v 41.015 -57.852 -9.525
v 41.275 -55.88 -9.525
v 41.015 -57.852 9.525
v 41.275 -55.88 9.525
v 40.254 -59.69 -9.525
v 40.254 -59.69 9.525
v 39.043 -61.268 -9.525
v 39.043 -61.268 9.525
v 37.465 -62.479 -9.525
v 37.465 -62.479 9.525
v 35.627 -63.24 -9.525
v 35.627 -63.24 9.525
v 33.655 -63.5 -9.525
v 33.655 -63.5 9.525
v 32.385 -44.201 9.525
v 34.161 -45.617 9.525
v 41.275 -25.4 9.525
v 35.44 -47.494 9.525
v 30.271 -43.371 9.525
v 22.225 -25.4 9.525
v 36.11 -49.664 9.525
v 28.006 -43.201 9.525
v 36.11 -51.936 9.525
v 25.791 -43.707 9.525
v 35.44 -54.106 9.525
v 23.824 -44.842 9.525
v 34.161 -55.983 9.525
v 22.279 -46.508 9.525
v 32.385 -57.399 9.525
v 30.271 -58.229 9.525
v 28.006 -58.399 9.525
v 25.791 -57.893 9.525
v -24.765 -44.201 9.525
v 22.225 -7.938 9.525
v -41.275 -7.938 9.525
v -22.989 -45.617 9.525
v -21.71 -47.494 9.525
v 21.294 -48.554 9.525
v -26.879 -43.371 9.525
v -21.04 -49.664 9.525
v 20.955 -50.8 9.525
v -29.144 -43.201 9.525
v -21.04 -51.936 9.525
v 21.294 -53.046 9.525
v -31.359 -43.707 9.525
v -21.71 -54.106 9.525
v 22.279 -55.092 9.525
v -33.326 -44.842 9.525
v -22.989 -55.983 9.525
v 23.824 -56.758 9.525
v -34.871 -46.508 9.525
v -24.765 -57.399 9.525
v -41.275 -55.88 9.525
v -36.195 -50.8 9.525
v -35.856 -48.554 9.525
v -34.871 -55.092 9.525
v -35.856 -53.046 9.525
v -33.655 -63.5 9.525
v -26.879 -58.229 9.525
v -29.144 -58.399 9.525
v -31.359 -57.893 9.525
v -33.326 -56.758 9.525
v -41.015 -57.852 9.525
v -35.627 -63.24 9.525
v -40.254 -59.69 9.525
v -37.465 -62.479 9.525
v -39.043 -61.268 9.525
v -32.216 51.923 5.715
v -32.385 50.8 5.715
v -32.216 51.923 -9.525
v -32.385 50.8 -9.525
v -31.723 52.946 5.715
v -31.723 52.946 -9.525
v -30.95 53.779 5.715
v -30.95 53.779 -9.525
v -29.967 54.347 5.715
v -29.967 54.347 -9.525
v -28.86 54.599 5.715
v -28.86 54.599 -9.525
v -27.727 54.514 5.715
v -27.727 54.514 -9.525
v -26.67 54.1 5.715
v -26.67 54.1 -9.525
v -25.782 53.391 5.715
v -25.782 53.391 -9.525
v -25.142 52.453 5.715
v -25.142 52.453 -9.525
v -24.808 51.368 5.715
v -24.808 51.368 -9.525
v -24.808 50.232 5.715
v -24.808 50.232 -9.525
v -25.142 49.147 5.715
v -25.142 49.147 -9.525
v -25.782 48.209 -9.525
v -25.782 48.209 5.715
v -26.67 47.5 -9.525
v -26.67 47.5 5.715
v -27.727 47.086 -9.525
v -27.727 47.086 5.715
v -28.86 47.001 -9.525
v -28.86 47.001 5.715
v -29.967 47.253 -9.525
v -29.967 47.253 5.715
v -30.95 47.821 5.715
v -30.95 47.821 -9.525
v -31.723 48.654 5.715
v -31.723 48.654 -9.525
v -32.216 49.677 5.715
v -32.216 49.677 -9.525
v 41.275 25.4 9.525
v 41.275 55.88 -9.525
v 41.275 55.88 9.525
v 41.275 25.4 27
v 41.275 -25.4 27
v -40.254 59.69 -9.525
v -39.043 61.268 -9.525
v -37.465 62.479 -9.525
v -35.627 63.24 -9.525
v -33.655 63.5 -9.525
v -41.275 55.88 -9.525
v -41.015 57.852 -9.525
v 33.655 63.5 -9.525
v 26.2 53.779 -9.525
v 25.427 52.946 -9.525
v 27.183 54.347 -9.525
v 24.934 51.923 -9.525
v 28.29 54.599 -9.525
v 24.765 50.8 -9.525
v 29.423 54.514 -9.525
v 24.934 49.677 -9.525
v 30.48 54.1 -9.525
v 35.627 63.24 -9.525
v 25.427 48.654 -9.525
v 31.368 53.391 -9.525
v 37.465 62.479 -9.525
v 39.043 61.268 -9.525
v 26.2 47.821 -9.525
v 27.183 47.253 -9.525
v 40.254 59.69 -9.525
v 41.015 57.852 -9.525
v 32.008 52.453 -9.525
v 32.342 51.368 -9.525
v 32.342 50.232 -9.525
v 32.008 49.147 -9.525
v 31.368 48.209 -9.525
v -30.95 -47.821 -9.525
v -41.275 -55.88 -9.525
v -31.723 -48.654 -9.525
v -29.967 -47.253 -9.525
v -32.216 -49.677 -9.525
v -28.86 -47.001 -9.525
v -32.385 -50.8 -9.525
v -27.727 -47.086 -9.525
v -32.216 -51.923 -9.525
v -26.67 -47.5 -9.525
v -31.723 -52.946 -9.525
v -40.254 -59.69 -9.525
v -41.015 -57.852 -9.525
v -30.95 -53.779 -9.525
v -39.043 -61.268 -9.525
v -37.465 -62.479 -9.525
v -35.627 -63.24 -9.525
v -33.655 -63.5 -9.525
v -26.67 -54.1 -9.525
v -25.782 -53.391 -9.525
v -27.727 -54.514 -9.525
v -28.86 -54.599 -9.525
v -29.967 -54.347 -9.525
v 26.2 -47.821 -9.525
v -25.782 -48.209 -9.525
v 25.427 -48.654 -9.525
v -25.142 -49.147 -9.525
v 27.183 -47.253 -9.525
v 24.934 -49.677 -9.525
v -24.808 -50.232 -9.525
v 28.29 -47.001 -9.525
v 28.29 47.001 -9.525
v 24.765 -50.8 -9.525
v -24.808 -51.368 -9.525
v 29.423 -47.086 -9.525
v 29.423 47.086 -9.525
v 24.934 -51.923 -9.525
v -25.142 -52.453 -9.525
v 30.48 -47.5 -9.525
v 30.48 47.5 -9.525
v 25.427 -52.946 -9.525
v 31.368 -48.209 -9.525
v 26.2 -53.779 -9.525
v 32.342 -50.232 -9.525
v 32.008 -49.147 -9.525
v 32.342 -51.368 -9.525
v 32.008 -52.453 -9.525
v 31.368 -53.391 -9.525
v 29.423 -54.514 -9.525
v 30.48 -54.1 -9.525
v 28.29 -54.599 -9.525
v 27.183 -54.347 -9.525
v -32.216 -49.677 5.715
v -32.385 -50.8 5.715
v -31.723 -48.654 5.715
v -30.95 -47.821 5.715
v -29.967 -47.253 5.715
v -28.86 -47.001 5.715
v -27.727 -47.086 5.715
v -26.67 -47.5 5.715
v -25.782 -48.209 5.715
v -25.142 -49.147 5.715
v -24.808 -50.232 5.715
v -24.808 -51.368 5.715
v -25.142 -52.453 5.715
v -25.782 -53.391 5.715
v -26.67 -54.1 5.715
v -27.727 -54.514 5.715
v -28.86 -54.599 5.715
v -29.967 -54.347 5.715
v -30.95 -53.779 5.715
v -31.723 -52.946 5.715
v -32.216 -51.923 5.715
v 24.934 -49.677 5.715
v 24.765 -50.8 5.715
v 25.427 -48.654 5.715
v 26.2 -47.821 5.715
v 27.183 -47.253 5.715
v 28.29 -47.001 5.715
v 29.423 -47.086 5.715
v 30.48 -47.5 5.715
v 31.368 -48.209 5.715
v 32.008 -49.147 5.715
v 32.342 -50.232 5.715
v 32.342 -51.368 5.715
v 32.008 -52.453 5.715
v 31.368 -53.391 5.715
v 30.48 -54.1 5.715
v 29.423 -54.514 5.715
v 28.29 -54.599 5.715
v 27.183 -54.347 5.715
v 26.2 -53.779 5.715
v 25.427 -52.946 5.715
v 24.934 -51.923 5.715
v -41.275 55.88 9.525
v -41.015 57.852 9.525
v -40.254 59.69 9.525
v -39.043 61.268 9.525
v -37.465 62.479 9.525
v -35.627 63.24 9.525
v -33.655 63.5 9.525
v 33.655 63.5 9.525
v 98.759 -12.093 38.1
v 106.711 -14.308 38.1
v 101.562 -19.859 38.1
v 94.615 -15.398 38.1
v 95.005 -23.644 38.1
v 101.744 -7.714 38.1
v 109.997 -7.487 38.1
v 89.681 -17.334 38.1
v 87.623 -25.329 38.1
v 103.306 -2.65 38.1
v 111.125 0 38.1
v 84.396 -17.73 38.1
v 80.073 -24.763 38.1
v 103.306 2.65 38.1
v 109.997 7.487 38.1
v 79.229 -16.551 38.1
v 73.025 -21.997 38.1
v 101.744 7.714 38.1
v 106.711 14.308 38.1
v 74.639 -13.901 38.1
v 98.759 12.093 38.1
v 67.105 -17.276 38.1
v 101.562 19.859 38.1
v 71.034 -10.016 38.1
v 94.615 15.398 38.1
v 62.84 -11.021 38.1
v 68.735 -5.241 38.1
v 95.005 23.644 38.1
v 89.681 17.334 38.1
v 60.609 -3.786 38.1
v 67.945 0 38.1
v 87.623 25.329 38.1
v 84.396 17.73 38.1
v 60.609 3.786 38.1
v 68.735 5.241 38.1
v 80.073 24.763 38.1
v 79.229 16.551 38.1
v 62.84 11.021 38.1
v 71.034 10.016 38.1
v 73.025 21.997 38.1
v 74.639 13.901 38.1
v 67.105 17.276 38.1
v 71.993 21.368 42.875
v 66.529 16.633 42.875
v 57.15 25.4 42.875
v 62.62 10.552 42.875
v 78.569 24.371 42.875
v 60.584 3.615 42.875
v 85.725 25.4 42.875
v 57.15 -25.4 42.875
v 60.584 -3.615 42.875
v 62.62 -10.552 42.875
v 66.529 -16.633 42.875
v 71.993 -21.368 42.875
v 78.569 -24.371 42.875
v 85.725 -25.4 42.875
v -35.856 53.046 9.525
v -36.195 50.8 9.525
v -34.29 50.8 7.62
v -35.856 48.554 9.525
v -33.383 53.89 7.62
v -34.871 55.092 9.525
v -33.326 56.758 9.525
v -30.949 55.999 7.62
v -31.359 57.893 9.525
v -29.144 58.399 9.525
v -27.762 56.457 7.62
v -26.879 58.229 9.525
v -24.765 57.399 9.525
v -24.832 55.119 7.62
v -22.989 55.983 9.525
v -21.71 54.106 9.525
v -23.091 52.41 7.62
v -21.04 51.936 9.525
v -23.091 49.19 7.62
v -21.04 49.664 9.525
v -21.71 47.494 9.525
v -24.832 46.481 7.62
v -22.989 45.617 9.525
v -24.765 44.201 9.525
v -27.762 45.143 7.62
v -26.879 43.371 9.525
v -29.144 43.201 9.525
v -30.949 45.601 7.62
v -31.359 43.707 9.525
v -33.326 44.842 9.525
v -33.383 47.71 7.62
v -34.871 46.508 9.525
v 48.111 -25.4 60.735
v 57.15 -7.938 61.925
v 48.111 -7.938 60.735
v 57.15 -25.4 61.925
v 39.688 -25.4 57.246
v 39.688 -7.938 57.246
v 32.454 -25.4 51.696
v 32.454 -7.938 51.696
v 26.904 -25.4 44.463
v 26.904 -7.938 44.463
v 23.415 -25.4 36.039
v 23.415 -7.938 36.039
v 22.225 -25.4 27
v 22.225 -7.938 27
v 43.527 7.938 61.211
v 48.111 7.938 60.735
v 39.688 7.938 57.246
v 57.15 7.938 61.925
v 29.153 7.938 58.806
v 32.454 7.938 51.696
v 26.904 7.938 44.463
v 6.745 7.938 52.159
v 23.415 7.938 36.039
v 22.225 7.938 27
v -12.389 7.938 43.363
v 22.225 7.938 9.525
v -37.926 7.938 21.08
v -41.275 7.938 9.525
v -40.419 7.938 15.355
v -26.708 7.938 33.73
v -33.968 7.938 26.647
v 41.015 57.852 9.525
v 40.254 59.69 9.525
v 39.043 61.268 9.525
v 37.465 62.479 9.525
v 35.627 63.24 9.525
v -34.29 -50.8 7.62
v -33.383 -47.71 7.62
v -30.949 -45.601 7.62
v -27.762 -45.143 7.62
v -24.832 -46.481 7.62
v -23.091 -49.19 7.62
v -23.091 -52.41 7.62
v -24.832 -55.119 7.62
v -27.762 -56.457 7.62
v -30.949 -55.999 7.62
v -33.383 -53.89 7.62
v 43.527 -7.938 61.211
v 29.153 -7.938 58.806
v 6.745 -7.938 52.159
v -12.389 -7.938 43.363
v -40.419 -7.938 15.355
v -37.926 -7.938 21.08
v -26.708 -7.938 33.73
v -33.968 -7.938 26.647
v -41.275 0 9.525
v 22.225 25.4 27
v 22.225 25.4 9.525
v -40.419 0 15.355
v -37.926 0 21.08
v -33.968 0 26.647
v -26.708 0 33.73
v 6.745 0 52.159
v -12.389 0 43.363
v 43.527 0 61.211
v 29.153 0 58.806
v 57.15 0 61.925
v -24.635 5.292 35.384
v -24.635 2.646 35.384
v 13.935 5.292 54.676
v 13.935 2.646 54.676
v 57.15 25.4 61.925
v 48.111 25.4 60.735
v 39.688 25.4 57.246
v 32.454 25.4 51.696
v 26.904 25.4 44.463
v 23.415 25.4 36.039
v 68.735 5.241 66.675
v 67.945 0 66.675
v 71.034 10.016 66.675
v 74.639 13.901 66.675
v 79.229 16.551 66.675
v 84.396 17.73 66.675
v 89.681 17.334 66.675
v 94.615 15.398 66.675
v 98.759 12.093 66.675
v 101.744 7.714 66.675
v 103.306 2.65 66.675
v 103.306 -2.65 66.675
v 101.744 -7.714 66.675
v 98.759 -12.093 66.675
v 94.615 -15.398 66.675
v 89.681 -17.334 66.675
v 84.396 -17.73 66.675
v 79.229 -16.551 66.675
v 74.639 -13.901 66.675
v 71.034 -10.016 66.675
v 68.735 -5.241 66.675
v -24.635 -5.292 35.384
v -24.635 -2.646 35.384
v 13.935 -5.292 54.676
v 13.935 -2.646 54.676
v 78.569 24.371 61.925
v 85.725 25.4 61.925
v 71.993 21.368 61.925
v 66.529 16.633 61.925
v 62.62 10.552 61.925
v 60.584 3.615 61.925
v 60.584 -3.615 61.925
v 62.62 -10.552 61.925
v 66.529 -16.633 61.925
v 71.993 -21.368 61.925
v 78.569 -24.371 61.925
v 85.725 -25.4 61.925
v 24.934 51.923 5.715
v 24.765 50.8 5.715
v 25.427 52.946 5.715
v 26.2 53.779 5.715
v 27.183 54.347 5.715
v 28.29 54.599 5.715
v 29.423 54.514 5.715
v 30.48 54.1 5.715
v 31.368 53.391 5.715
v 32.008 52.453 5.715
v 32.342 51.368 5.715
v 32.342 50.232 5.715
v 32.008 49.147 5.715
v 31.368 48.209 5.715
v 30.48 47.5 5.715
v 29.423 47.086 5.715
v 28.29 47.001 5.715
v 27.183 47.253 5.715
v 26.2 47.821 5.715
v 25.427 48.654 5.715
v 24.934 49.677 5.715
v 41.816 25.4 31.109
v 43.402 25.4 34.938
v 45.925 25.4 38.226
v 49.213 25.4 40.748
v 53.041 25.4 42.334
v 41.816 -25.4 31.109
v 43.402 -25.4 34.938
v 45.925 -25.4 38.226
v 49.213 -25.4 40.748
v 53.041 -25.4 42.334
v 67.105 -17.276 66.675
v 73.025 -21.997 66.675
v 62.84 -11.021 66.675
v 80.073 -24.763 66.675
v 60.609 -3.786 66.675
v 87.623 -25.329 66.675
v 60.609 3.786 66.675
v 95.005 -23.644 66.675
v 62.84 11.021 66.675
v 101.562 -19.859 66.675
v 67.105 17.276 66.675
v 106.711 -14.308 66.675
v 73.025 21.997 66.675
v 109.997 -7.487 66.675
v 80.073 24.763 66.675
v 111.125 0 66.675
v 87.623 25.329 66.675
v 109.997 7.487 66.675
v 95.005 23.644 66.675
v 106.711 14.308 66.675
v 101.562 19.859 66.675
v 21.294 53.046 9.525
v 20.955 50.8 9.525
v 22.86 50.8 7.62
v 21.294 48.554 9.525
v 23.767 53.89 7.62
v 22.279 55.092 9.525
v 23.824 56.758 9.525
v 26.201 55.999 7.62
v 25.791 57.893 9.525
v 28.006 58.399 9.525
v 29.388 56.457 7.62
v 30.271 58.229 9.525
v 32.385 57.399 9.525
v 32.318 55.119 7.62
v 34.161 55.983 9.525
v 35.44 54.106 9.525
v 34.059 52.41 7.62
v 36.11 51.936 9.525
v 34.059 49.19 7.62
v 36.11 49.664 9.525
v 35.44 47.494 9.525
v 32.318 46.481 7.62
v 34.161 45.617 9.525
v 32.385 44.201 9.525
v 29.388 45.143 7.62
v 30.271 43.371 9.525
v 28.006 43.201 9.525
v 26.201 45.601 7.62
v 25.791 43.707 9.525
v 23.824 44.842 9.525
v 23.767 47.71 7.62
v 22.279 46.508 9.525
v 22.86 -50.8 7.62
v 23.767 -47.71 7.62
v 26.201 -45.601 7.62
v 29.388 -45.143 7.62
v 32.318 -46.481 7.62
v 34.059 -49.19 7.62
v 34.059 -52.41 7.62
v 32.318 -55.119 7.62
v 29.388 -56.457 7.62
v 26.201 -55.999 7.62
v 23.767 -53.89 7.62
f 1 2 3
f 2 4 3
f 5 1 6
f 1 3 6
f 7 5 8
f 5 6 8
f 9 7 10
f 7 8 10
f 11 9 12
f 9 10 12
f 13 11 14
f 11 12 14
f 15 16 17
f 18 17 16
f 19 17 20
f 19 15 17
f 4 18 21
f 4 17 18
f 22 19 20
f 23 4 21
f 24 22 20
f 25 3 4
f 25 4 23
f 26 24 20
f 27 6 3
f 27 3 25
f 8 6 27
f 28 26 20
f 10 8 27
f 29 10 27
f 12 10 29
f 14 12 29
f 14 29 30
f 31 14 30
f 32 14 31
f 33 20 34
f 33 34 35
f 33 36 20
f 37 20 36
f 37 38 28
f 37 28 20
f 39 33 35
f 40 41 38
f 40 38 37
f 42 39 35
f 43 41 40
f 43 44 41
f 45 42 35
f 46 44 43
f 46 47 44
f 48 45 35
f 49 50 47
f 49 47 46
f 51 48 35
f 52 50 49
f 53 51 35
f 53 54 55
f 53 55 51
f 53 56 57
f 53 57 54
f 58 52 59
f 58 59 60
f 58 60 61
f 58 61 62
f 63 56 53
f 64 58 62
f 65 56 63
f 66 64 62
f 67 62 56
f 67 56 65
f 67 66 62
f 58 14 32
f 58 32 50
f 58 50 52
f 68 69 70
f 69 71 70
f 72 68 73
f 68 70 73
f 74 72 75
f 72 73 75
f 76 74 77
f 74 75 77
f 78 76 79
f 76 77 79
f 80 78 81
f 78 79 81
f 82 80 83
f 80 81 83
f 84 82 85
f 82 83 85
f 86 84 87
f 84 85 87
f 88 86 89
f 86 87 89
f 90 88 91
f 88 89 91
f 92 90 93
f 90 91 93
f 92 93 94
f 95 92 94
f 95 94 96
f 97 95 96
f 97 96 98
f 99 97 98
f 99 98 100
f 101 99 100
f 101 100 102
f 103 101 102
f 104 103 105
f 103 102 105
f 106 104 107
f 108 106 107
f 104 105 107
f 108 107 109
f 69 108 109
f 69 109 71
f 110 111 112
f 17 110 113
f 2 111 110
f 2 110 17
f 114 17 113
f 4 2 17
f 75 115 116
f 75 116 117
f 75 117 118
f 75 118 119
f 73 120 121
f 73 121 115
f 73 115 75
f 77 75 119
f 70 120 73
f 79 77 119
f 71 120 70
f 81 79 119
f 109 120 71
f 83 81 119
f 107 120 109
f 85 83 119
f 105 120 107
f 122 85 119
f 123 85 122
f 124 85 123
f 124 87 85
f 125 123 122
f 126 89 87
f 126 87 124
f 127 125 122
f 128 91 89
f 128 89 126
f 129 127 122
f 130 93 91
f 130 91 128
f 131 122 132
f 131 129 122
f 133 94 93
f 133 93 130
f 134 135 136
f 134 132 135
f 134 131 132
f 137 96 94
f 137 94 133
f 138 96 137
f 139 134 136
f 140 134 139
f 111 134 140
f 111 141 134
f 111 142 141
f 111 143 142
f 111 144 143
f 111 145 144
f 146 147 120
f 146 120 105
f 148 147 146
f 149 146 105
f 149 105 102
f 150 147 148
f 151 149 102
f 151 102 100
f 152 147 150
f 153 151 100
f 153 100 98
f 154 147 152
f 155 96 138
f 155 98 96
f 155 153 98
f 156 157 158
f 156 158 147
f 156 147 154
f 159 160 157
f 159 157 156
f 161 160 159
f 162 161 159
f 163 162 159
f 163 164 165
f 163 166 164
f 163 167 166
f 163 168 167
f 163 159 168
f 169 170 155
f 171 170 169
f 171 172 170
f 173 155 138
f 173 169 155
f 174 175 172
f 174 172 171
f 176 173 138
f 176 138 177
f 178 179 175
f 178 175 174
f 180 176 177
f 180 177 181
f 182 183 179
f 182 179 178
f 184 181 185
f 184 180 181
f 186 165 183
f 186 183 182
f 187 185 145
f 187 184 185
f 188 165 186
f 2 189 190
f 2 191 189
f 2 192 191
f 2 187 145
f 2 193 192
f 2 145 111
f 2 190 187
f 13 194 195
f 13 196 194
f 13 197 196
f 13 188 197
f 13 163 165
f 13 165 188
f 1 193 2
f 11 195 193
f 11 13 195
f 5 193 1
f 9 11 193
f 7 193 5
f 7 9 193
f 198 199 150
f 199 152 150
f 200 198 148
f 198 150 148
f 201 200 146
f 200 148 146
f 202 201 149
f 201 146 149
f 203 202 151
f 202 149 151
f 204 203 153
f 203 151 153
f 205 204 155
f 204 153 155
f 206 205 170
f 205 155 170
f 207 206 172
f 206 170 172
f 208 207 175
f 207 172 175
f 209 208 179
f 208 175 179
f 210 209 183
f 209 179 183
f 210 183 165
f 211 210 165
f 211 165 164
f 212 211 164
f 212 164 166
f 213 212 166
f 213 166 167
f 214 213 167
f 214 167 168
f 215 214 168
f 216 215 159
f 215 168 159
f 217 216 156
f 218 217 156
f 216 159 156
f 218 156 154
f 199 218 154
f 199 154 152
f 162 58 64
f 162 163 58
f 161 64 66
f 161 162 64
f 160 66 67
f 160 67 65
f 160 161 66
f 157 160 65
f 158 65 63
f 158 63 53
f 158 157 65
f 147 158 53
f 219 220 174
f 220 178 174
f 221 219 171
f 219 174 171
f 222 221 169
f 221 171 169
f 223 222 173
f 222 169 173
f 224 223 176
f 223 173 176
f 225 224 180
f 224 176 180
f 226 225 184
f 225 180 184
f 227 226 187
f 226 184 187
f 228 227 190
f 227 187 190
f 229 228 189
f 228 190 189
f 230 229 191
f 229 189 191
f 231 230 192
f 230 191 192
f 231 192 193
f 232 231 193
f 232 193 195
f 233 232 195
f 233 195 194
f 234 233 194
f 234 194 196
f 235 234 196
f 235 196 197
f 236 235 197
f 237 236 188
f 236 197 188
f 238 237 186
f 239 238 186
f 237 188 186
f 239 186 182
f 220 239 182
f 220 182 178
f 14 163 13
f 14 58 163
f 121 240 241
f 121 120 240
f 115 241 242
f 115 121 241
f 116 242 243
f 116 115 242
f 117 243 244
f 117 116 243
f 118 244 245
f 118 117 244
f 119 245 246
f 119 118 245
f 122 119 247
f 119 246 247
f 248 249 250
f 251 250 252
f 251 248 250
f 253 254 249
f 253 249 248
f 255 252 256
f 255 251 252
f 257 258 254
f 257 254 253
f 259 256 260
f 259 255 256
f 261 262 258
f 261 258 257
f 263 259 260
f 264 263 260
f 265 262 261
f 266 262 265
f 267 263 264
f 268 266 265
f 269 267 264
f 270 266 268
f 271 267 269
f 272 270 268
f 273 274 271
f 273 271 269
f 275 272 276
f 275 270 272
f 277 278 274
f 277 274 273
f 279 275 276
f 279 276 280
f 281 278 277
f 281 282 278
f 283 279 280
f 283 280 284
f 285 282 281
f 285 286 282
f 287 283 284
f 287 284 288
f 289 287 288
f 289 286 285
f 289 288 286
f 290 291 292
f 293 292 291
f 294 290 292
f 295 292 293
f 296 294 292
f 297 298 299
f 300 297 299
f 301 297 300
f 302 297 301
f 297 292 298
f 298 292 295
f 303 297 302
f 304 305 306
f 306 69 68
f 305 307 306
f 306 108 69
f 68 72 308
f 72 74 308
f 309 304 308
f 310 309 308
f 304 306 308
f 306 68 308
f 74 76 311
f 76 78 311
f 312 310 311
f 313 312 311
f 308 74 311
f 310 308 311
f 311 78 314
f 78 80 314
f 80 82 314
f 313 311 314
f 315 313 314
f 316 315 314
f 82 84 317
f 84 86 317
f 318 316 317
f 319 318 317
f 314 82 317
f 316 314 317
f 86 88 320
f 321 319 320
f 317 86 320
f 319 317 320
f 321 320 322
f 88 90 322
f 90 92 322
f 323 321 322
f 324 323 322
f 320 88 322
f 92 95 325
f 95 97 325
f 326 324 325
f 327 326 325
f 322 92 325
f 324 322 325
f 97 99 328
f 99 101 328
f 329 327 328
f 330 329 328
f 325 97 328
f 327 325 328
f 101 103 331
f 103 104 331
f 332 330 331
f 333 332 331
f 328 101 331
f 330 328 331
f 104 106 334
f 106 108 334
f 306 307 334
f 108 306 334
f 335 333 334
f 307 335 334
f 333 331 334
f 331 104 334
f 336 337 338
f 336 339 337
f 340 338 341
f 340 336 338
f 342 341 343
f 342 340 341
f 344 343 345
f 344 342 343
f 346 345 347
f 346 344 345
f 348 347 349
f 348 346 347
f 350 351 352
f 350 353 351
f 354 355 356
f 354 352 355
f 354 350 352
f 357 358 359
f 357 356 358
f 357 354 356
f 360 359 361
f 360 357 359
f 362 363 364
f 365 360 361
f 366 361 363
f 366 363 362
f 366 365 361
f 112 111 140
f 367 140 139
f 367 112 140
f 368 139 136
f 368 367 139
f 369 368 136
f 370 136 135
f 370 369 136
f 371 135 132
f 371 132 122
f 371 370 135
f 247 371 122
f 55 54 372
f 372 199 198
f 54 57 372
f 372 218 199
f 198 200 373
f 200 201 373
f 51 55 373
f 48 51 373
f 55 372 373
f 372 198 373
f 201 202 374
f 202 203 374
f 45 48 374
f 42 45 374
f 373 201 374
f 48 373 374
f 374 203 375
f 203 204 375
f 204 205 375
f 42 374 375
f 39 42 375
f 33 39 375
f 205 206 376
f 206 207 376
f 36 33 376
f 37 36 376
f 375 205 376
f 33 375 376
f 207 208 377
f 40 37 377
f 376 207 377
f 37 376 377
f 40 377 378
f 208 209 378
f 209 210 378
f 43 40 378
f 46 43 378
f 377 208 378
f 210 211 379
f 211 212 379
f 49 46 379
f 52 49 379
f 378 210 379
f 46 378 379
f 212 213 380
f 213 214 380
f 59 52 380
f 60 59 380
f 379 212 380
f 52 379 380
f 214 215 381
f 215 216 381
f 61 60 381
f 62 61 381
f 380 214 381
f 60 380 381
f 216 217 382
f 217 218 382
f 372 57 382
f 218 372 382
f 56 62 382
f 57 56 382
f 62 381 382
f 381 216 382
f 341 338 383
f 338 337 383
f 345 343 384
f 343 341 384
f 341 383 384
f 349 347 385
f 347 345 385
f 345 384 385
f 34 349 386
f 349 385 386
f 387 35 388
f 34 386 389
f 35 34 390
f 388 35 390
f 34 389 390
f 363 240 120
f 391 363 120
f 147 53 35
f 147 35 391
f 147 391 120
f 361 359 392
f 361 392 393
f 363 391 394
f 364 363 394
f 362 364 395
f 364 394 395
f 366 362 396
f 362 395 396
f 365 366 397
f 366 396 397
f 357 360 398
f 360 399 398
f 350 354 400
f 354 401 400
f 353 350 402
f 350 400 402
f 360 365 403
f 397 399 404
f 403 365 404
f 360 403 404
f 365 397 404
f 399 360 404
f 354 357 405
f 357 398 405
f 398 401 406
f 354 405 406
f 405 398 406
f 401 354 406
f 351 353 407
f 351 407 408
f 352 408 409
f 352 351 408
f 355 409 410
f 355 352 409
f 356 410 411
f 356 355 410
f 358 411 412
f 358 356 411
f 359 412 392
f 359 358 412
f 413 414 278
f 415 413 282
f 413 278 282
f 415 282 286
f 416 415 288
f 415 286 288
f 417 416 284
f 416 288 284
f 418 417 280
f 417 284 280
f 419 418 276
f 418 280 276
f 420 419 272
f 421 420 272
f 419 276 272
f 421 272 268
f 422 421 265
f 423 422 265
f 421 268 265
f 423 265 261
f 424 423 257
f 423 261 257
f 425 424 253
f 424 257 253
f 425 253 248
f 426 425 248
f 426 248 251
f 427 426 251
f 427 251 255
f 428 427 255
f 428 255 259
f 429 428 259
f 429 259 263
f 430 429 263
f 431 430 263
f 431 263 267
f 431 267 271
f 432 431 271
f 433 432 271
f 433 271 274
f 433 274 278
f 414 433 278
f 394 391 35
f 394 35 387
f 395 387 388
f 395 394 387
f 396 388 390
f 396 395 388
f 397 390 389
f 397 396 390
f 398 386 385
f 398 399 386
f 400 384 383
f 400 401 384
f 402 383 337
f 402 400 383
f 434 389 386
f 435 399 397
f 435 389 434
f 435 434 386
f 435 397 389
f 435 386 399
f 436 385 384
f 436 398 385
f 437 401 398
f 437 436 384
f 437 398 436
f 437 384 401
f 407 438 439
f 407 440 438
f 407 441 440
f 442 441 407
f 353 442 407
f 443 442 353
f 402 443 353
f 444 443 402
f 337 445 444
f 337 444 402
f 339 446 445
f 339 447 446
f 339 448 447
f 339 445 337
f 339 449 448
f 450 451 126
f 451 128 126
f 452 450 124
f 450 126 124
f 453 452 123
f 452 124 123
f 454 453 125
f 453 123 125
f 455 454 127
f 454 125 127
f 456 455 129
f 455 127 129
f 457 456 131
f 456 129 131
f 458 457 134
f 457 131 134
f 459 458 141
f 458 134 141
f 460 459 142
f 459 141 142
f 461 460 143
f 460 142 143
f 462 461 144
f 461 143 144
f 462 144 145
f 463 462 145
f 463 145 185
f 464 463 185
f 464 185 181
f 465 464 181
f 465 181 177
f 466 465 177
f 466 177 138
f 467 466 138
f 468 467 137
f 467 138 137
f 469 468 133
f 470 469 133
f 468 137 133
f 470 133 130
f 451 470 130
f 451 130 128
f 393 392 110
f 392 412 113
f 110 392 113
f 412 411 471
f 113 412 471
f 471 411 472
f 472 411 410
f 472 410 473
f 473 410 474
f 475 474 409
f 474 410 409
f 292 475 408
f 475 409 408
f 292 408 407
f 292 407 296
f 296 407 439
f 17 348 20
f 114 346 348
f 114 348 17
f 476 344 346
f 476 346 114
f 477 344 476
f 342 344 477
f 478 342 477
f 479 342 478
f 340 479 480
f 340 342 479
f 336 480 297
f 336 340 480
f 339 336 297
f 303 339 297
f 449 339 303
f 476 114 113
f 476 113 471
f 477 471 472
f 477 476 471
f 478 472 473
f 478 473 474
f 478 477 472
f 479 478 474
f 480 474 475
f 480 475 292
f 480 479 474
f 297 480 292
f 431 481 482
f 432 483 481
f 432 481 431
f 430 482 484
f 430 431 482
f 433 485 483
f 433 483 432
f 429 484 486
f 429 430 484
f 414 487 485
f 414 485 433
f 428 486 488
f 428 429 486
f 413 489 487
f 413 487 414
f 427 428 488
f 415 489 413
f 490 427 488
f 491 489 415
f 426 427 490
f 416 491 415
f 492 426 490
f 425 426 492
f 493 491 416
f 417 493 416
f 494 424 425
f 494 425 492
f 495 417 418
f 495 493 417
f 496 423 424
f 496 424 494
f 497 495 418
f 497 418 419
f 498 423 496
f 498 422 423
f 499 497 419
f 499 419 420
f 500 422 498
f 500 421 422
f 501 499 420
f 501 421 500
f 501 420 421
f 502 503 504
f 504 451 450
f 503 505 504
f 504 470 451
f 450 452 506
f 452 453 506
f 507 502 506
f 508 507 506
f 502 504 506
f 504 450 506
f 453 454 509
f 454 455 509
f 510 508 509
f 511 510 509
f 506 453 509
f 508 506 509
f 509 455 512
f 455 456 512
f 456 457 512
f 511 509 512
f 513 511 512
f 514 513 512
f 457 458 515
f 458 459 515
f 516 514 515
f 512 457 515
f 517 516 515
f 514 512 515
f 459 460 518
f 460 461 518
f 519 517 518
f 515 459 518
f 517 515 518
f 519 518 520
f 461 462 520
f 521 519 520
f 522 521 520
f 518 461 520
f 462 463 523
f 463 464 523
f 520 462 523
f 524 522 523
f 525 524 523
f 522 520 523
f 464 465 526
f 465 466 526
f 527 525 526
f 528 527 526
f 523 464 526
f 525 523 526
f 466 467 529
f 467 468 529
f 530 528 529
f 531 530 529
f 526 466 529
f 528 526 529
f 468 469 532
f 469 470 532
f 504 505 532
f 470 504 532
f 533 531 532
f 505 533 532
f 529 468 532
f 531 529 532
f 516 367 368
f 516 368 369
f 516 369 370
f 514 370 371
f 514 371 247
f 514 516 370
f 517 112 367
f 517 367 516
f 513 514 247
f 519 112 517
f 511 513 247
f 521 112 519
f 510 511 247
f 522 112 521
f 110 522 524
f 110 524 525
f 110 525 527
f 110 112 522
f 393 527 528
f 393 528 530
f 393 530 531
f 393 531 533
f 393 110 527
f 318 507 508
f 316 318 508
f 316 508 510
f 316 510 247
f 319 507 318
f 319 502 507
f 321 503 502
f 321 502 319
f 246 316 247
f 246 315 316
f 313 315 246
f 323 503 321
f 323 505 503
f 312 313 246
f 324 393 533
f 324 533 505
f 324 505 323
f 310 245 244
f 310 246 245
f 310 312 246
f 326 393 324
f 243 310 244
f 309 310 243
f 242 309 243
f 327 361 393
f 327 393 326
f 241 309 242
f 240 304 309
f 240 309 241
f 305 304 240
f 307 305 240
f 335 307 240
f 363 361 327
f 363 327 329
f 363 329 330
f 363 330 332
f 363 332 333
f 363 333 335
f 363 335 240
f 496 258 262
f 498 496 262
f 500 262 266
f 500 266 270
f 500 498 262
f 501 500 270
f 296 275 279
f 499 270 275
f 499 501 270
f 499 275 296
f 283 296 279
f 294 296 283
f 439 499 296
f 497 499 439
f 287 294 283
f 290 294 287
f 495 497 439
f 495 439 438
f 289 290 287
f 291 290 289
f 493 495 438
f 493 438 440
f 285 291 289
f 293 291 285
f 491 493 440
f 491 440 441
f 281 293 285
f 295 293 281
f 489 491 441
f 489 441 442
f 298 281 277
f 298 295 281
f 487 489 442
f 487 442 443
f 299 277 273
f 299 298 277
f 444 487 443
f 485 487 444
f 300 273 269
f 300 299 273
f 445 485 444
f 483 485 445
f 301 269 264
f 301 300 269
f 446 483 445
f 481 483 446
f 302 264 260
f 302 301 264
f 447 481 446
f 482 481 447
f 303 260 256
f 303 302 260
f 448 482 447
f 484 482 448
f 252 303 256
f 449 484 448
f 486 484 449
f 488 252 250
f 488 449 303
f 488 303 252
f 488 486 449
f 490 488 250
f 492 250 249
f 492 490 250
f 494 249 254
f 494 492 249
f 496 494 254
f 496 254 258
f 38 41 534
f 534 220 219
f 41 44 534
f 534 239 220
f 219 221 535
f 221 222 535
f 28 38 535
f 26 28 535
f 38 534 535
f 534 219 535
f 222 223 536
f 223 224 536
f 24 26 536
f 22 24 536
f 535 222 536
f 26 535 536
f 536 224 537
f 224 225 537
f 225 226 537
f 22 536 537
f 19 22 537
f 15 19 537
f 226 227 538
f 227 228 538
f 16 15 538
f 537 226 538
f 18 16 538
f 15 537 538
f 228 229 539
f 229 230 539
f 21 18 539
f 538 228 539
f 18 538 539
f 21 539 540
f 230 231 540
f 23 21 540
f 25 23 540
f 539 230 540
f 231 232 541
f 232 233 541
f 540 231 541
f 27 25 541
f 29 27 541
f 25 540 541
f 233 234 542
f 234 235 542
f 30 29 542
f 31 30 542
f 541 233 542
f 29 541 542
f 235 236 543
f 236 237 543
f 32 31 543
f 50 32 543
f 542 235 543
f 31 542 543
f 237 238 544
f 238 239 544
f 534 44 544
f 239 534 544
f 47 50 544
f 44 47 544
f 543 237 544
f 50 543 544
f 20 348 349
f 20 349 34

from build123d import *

# Parameters (mm, degrees)
F1_DEPTH       = 63.5
F0_W           = 25.4
F0_H           = 19.05
F2_DEPTH       = 25.4
F3_DEPTH       = 7.9375
F5_R           = 7.62
F7_D           = 7.62
F7_CSINK_D     = 15.24
F7_CSINK_ANGLE = 90
F8_D           = 7.62
F8_CSINK_D     = 15.24
F8_CSINK_ANGLE = 90
F10_D          = 35.56


with BuildPart() as f1:
    # F0 (on Front) → F1 (new body, symmetric)
    with BuildSketch(Plane.XZ):
        Polygon((22.225, 9.525), (-41.275, 9.525), (-41.275, -9.525), (41.275, -9.525), (41.275, 9.525), align=None)
    extrude(amount=F1_DEPTH, both=True)

    # F0 (on Front) → F2 (join, symmetric)
    with BuildSketch(Plane.XZ):
        with BuildLine():
            Line((22.225, 27.0002), (22.225, 9.525))
            Line((22.225, 9.525), (41.275, 9.525))
            Line((41.275, 9.525), (41.275, 27.0002))
            ThreePointArc((41.275, 27.0002), (45.9246798487, 38.2255201513), (57.15, 42.8752))
            Line((57.15, 42.8752), (60.325, 42.8752))
            Line((60.325, 42.8752), (60.325, 61.9252))
            Line((60.325, 61.9252), (57.15, 61.9252))
            ThreePointArc((57.15, 61.9252), (32.4542956671, 51.6959043329), (22.225, 27.0002))
        make_face()
        with Locations((73.025, 52.4002)):
            Rectangle(F0_W, F0_H)
    extrude(amount=F2_DEPTH, both=True)

    # F0 (on Front) → F3 (join, symmetric)
    with BuildSketch(Plane.XZ):
        with BuildLine():
            add(Edge.make_bspline(
                [(-41.275, 9.525), (-41.3618534803, 36.8419066072), (17.3745620996, 62.5231936574), (57.15, 61.9252)],
                knots=[0, 0, 0, 0, 111.5045361635, 111.5045361635, 111.5045361635, 111.5045361635], degree=3))
            Line((-41.275, 9.525), (22.225, 9.525))
            Line((22.225, 9.525), (22.225, 27.0002))
            ThreePointArc((22.225, 27.0002), (32.4542956671, 51.6959043329), (57.15, 61.9252))
        make_face()
    extrude(amount=F3_DEPTH, both=True)

    # F0 (on Front) → F4 (revolve)
    with BuildSketch(Plane.XZ):
        Polygon((85.725, 66.675), (85.725, 61.9252), (85.725, 42.8752), (85.725, 38.1), (111.125, 38.1), (111.125, 66.675), align=None)
    revolve(axis=Axis((85.725, 0, 52.3875), (0, 0, 1)))

    # F5
    f5_edges = [f1.edges().sort_by_distance(p)[0] for p in [
        (-41.275, -63.5, 0),
        (41.275, -63.5, 0),
        (-41.275, 63.5, 0),
        (41.275, 63.5, 0),
    ]]
    fillet(f5_edges, radius=F5_R)

    # F7 (through all)
    with Locations(Plane.XY.offset(9.525)):
        with Locations((-28.575, 50.8)):
            CounterSinkHole(F7_D / 2, F7_CSINK_D / 2, counter_sink_angle=F7_CSINK_ANGLE)

    # F8 (through all)
    with Locations(Plane.XY.offset(9.525)):
        with Locations((-28.575, -50.8), (28.575, -50.8), (28.575, 50.8)):
            CounterSinkHole(F8_D / 2, F8_CSINK_D / 2, counter_sink_angle=F8_CSINK_ANGLE)

    # F10 (through all)
    with Locations(Plane.XY.offset(66.675)):
        with Locations((85.725, 0)):
            Hole(F10_D / 2)


solid = f1.part
